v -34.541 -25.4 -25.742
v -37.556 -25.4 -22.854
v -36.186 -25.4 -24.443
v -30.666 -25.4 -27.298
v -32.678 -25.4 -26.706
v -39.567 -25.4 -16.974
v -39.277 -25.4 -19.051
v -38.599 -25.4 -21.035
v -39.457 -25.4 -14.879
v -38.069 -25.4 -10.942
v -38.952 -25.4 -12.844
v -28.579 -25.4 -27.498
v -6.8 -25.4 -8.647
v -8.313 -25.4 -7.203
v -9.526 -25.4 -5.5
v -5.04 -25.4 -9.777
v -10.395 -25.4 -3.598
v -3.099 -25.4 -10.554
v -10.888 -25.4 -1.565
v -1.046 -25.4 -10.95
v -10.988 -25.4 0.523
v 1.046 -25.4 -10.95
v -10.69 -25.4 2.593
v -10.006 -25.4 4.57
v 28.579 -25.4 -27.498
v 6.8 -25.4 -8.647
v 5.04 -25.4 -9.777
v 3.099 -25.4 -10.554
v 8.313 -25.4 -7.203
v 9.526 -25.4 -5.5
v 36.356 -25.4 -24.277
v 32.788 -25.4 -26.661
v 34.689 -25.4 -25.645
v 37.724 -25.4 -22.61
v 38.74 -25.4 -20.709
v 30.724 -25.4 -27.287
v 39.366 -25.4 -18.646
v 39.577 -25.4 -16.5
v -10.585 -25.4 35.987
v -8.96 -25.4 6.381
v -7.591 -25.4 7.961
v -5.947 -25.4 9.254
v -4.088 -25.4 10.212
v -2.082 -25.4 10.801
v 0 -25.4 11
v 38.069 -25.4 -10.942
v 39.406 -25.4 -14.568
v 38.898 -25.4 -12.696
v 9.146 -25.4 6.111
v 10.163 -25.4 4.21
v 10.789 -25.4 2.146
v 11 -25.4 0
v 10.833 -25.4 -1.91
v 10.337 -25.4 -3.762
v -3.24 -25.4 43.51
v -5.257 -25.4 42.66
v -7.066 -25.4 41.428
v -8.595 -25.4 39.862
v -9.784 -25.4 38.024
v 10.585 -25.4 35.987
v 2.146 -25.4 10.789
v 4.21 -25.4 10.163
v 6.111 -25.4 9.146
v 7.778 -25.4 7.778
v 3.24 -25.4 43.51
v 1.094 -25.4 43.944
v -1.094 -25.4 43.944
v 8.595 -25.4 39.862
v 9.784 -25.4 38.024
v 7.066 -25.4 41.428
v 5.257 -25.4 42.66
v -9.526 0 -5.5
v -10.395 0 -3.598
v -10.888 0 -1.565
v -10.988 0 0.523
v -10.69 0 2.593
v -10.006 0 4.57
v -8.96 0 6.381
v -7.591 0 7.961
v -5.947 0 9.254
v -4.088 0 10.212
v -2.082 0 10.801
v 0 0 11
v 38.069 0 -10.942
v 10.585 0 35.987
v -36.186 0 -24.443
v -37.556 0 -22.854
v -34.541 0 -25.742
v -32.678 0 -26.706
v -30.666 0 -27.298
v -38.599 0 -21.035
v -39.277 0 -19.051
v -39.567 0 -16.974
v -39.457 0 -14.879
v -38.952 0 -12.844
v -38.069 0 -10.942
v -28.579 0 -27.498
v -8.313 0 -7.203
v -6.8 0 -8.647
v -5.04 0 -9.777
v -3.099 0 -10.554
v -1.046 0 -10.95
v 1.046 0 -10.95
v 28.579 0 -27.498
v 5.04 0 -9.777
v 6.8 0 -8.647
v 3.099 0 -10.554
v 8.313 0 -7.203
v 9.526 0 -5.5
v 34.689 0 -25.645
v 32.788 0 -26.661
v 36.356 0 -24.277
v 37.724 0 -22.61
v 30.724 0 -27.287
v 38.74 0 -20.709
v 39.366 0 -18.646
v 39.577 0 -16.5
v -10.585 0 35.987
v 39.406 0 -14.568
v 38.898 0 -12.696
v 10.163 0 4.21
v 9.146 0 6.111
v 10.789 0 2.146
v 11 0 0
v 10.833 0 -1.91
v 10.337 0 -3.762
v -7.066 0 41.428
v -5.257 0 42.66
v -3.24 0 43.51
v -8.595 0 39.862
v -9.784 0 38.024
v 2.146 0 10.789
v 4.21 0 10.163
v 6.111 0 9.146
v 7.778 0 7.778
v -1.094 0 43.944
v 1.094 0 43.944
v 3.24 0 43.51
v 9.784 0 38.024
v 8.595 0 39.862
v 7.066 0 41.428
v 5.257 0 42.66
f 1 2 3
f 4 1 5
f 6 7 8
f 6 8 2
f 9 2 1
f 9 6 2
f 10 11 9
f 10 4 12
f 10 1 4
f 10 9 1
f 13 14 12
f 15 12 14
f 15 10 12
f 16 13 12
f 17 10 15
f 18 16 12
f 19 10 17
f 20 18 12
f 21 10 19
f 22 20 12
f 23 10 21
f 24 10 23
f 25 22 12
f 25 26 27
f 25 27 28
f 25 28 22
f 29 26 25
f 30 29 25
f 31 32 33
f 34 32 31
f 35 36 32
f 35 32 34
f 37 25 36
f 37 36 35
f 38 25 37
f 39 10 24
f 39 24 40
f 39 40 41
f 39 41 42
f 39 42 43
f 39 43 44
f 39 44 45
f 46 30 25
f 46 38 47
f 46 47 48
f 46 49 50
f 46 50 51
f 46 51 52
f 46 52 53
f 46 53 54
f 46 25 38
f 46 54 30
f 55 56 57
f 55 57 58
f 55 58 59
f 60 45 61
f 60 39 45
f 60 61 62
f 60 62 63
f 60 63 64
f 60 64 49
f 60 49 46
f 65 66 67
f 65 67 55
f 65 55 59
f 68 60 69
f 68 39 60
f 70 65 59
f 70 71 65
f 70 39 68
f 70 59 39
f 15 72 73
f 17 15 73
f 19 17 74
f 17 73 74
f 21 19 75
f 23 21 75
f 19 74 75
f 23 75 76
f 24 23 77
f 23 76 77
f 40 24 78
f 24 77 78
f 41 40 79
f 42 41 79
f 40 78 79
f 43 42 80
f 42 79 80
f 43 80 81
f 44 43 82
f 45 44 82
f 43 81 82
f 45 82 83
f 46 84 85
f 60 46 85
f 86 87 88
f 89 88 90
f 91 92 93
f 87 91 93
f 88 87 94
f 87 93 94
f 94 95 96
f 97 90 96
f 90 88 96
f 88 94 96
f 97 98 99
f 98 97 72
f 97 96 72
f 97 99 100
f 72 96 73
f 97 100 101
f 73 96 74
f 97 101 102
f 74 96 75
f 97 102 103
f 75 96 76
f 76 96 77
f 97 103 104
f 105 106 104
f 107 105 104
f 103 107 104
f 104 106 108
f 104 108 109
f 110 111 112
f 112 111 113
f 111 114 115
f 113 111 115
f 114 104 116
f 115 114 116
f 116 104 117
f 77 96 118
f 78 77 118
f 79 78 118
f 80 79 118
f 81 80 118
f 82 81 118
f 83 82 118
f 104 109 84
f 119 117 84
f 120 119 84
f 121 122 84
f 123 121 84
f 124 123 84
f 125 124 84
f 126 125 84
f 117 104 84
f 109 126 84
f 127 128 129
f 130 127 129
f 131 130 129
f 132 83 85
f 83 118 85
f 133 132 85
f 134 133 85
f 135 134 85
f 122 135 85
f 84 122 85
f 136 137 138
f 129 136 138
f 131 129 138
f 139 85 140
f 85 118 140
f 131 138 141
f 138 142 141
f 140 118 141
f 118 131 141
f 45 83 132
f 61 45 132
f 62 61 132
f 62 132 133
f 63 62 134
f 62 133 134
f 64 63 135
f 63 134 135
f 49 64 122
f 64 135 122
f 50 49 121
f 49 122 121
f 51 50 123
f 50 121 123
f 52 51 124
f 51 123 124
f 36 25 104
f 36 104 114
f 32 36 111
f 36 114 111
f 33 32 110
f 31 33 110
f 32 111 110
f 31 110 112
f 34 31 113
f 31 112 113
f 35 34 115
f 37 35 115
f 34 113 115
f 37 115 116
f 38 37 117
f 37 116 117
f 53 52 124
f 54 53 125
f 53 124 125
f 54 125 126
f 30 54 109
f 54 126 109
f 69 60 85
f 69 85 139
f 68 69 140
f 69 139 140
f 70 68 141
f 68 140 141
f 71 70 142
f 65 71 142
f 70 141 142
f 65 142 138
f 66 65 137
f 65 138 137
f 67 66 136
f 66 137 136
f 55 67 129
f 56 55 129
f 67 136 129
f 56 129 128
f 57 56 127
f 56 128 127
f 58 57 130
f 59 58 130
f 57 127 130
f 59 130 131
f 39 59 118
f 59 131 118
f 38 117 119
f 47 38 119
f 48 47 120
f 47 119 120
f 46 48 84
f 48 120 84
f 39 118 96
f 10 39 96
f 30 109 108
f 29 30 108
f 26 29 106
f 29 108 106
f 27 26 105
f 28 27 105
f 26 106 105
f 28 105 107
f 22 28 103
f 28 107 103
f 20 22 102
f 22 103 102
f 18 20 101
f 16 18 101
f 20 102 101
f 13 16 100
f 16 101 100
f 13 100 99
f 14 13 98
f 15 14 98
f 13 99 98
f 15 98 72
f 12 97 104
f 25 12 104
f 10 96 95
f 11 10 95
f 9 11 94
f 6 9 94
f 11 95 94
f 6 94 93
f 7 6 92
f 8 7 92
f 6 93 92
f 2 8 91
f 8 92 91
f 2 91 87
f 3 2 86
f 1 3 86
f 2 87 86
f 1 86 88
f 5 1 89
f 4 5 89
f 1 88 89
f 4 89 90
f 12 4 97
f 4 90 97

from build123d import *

# Parameters (mm, degrees)
F1_DEPTH = 25.4


with BuildPart() as f1:
    # F0 (on Front) → F1 (new body)
    with BuildSketch(Plane.XZ):
        with BuildLine():
            ThreePointArc((0, 11), (7.778175, 7.778175), (11, 0))
            ThreePointArc((11, 0), (10.625184, -2.847009), (9.526279, -5.5))
            Line((9.526279, -5.5), (19.054118, -11.0009))
            ThreePointArc((19.054118, -11.0009), (28.544672, -5.501853), (38.069208, -10.941828))
            Line((38.069208, -10.941828), (10.584951, 35.986505))
            ThreePointArc((10.584951, 35.986505), (10.894398, 34.50748), (10.9982, 33))
            ThreePointArc((10.9982, 33), (7.776902, 25.223098), (0, 22.0018))
            Line((0, 22.0018), (0, 11))
        make_face()
        with BuildLine():
            ThreePointArc((-9.526279, -5.5), (-9.526279, 5.5), (0, 11))
            Line((0, 11), (0, 22.0018))
            ThreePointArc((0, 22.0018), (-8.769452, 26.362447), (-10.584951, 35.986505))
            Line((-10.584951, 35.986505), (-38.069208, -10.941828))
            ThreePointArc((-38.069208, -10.941828), (-28.544671, -5.501853), (-19.054118, -11.0009))
            Line((-19.054118, -11.0009), (-9.526279, -5.5))
        make_face()
        with BuildLine():
            Line((19.054118, -11.0009), (9.526279, -5.5))
            ThreePointArc((9.526279, -5.5), (0, -11), (-9.526279, -5.5))
            Line((-9.526279, -5.5), (-19.054118, -11.0009))
            ThreePointArc((-19.054118, -11.0009), (-17.955393, -13.653456), (-17.580638, -16.5))
            ThreePointArc((-17.580638, -16.5), (-20.801936, -24.276902), (-28.578838, -27.4982))
            Line((-28.578838, -27.4982), (28.578838, -27.4982))
            ThreePointArc((28.578838, -27.4982), (19.054118, -21.9991), (19.054118, -11.0009))
        make_face()
        with BuildLine():
            ThreePointArc((-10.584951, 35.986505), (-8.769452, 26.362447), (0, 22.0018))
            ThreePointArc((0, 22.0018), (7.776902, 25.223098), (10.9982, 33))
            ThreePointArc((10.9982, 33), (10.894398, 34.50748), (10.584951, 35.986505))
            ThreePointArc((10.584951, 35.986505), (0, 43.9982), (-10.584951, 35.986505))
        make_face()
        with BuildLine():
            ThreePointArc((38.069208, -10.941828), (28.544672, -5.501853), (19.054118, -11.0009))
            ThreePointArc((19.054118, -11.0009), (19.054118, -21.9991), (28.578838, -27.4982))
            ThreePointArc((28.578838, -27.4982), (36.35574, -24.276902), (39.577038, -16.5))
            ThreePointArc((39.577038, -16.5), (39.19339, -13.620467), (38.069208, -10.941828))
        make_face()
        with BuildLine():
            ThreePointArc((-17.580638, -16.5), (-17.955393, -13.653456), (-19.054118, -11.0009))
            ThreePointArc((-19.054118, -11.0009), (-28.544671, -5.501853), (-38.069208, -10.941828))
            ThreePointArc((-38.069208, -10.941828), (-38.120596, -21.969484), (-28.578838, -27.4982))
            ThreePointArc((-28.578838, -27.4982), (-20.801936, -24.276902), (-17.580638, -16.5))
        make_face()
    extrude(amount=F1_DEPTH)


solid = f1.part
